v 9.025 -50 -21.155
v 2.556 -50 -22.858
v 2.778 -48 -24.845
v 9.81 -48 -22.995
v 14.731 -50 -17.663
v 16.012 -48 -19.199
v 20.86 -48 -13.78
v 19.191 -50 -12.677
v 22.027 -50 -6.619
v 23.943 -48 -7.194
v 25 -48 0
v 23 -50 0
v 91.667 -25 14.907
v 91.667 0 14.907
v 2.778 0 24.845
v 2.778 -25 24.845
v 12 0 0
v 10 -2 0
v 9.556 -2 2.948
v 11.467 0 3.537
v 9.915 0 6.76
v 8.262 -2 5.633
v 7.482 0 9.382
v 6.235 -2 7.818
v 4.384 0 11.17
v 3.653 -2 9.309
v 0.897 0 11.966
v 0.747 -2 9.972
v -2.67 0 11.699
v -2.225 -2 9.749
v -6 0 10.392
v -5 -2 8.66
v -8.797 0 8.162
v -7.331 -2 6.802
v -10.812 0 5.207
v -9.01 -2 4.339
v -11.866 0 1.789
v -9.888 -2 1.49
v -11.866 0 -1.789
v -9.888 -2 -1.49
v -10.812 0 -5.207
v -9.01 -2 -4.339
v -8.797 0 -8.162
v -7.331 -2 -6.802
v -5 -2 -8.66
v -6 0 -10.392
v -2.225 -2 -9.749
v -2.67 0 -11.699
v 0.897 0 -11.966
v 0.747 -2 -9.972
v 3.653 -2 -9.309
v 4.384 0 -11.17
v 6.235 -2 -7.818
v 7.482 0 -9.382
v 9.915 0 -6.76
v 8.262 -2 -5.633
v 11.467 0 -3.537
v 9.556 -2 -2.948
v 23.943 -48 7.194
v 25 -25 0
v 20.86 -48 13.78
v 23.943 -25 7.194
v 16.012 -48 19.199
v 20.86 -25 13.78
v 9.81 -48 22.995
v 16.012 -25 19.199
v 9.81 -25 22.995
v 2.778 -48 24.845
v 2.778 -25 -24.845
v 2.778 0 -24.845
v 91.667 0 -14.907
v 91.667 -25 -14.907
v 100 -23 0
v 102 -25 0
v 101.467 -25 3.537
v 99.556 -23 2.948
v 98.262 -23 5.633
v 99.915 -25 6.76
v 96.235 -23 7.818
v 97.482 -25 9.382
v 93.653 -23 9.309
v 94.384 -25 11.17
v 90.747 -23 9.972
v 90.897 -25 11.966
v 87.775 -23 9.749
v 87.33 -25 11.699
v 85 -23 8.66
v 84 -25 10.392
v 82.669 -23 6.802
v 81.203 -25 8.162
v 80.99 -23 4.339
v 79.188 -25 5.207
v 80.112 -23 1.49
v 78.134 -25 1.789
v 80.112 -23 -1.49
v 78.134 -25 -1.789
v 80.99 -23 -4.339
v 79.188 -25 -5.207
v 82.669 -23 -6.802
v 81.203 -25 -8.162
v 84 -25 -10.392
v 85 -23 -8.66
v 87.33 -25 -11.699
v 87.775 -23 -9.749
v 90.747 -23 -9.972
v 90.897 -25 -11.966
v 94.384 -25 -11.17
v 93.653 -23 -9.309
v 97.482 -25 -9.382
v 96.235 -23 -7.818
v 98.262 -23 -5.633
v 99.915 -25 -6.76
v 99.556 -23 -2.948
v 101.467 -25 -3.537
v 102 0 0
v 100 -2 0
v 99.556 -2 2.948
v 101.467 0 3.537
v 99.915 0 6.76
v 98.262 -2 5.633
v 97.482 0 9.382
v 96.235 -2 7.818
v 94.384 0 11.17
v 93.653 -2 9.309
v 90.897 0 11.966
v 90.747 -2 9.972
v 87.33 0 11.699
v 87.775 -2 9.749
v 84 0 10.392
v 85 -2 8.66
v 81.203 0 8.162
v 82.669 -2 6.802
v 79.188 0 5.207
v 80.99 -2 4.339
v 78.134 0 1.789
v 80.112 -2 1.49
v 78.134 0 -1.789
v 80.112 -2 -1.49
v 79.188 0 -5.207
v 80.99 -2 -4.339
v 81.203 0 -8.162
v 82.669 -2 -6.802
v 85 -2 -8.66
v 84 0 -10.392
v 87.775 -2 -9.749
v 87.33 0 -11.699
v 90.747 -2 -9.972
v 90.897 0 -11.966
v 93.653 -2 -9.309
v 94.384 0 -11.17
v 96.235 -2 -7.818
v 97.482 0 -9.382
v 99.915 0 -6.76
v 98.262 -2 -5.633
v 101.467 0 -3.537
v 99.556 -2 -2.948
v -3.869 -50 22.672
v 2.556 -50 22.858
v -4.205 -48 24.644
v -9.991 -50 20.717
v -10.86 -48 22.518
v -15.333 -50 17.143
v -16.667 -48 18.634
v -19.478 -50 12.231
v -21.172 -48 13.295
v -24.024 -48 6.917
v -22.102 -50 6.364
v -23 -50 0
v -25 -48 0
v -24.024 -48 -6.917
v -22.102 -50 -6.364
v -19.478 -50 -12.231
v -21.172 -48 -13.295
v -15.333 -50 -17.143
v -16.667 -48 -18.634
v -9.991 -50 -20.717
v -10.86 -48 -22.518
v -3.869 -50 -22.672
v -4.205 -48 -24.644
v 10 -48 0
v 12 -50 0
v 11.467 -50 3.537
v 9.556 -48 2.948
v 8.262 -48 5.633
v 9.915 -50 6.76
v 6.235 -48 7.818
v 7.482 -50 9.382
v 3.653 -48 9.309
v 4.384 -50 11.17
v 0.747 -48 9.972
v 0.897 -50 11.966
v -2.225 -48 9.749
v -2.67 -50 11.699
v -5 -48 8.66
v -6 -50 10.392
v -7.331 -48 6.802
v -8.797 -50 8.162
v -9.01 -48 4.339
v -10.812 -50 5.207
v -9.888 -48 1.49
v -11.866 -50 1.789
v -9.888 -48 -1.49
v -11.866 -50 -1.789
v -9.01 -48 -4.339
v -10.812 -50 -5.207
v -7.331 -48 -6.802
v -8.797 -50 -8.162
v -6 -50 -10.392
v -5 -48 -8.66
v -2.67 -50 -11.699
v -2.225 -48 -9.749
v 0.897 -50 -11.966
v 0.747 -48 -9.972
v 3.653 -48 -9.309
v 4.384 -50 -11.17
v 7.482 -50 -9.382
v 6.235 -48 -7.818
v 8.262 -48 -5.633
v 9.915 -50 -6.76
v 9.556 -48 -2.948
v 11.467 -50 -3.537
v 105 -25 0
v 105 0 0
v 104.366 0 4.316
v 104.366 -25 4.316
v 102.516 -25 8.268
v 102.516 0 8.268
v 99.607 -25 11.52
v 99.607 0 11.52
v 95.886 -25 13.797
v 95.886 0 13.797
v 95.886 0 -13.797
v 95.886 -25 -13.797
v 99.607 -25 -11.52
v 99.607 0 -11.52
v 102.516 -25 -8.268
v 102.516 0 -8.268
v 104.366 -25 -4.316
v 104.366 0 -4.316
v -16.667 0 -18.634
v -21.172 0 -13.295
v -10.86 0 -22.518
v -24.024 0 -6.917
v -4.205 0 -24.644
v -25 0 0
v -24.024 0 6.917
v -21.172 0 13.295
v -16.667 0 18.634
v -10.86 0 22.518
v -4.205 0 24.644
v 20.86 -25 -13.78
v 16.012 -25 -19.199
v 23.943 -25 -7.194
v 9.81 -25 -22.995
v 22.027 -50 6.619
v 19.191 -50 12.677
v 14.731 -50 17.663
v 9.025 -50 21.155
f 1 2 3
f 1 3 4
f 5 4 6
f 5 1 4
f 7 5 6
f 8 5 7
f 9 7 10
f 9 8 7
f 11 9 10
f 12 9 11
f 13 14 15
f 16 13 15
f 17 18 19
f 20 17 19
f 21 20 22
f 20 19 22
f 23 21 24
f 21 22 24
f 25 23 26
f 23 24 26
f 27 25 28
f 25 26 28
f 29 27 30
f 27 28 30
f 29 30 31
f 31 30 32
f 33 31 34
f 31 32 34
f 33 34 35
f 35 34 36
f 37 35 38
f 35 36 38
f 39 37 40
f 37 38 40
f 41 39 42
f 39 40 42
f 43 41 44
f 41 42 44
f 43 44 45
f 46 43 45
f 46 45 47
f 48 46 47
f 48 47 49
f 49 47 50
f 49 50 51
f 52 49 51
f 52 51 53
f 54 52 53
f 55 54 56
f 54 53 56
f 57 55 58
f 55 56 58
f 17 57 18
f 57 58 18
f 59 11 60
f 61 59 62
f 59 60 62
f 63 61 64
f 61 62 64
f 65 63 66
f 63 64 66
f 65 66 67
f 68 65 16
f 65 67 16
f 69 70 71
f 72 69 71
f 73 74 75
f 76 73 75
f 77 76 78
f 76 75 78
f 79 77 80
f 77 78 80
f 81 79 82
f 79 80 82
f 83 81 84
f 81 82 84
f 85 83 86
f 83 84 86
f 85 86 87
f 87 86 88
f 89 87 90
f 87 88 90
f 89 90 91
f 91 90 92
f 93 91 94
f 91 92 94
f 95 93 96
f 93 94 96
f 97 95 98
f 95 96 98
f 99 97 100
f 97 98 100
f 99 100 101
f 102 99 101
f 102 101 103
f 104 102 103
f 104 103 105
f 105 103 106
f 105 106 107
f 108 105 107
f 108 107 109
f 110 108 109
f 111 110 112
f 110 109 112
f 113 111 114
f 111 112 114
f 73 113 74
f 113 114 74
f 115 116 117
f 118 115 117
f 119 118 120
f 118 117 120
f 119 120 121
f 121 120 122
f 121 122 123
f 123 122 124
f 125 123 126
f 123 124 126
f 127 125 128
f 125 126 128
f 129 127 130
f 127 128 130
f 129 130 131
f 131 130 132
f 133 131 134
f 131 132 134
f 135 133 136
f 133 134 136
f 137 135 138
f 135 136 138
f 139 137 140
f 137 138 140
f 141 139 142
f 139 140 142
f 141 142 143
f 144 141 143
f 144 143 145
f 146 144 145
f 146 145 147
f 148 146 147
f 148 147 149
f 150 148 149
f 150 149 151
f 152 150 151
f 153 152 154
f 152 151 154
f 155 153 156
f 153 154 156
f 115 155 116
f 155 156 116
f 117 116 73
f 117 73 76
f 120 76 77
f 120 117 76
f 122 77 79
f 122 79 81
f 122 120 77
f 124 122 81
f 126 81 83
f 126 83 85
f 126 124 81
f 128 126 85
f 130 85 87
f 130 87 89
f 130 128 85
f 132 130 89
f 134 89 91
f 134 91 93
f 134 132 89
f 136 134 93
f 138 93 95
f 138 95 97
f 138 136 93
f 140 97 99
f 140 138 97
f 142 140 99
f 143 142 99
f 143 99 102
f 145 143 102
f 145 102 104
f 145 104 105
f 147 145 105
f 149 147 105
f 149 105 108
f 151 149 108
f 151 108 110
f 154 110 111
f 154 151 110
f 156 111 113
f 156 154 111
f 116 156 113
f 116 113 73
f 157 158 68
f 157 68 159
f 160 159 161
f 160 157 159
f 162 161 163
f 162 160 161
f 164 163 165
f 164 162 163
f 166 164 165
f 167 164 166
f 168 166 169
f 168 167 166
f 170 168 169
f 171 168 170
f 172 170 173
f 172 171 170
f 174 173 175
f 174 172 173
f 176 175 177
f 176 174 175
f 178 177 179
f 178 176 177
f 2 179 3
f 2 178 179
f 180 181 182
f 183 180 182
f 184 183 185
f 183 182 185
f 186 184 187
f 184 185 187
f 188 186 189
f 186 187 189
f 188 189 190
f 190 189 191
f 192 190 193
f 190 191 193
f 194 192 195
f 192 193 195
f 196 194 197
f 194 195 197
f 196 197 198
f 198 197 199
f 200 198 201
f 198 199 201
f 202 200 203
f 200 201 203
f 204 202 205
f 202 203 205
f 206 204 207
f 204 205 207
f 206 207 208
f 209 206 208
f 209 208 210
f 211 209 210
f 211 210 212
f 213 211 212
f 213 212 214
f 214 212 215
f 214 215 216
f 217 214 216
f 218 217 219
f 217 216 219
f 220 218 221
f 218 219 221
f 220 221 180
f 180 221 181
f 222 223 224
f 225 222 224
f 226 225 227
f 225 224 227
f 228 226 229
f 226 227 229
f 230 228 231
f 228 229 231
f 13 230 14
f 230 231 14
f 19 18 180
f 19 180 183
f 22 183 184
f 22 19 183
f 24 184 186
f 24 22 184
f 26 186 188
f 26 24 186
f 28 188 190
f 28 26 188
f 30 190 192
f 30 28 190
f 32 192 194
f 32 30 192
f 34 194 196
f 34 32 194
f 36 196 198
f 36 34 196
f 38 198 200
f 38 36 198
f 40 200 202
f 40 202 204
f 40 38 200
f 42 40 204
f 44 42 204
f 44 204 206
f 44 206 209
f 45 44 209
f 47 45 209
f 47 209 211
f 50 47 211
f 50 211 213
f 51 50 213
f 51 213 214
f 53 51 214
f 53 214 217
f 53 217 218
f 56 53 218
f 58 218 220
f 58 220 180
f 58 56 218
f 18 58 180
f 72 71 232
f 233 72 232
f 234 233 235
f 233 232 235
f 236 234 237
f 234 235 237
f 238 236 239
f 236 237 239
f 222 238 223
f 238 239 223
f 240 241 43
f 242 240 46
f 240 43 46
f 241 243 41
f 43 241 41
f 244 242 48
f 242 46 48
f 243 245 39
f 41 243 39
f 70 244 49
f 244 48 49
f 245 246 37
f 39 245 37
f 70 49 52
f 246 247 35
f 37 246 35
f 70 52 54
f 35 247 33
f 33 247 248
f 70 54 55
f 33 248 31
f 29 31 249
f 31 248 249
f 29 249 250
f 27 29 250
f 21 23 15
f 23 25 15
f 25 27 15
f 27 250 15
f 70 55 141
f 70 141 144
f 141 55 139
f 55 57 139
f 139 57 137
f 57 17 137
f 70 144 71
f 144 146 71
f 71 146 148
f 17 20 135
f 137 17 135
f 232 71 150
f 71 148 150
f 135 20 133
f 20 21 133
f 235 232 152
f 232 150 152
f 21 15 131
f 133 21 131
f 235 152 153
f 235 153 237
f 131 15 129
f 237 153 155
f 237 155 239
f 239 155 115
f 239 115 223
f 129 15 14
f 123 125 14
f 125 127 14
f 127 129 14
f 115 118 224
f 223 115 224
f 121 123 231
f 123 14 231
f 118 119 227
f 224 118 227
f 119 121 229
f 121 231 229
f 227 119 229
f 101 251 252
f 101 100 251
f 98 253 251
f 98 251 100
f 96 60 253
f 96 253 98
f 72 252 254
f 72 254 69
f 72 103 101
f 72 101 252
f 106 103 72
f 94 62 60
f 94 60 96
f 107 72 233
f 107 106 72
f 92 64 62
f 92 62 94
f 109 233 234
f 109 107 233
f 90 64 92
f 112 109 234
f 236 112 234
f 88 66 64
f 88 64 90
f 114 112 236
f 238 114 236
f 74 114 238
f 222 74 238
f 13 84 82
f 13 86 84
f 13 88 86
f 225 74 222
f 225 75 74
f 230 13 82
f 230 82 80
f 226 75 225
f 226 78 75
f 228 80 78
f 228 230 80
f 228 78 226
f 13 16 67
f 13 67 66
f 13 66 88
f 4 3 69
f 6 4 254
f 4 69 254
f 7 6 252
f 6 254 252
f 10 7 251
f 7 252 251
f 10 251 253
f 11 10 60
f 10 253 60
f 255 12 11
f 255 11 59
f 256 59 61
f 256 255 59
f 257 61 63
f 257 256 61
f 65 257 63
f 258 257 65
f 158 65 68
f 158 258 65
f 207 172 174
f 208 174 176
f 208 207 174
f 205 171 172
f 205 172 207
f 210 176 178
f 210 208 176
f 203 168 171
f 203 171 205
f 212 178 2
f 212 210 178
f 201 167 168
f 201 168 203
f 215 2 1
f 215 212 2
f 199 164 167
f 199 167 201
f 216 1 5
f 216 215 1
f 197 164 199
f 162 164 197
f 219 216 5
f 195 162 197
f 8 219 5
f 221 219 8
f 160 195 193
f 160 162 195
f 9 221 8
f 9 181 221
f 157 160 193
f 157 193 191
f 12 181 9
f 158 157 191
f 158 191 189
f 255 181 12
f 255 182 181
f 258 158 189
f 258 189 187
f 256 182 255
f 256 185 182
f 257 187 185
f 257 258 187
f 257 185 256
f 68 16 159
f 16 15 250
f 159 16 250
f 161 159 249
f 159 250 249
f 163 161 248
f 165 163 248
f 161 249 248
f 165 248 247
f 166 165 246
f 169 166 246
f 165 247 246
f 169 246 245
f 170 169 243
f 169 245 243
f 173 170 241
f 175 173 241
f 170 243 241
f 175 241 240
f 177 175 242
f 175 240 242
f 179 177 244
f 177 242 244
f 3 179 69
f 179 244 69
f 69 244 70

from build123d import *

# Parameters (mm, degrees)
F0_R     = 10
F1_DEPTH = 25
F2_DEPTH = 50
F3_SIZE  = 2


with BuildPart() as f1:
    # F0 (on Front) → F1 (new body)
    with BuildSketch(Plane.XZ):
        with BuildLine():
            ThreePointArc((2.777778, -24.8452), (18.6339, -16.666667), (25, 0))
            ThreePointArc((25, 0), (18.6339, 16.666667), (2.777778, 24.8452))
            ThreePointArc((2.777778, 24.8452), (-25, 0), (2.777778, -24.8452))
        make_face()
        Circle(F0_R, mode=Mode.SUBTRACT)
        with BuildLine():
            ThreePointArc((2.777778, 24.8452), (18.6339, 16.666667), (25, 0))
            ThreePointArc((25, 0), (18.6339, -16.666667), (2.777778, -24.8452))
            Line((2.777778, -24.8452), (91.666667, -14.90712))
            ThreePointArc((91.666667, -14.90712), (75, 0), (91.666667, 14.90712))
            Line((91.666667, 14.90712), (2.777778, 24.8452))
        make_face()
        with BuildLine():
            ThreePointArc((105, 0), (101.18034, 10), (91.666667, 14.90712))
            ThreePointArc((91.666667, 14.90712), (75, 0), (91.666667, -14.90712))
            ThreePointArc((91.666667, -14.90712), (101.18034, -10), (105, 0))
        make_face()
        with Locations((90, 0)):
            Circle(F0_R, mode=Mode.SUBTRACT)
    extrude(amount=F1_DEPTH)

    # F0 (on Front) → F2 (join)
    with BuildSketch(Plane.XZ):
        with BuildLine():
            ThreePointArc((2.777778, -24.8452), (18.6339, -16.666667), (25, 0))
            ThreePointArc((25, 0), (18.6339, 16.666667), (2.777778, 24.8452))
            ThreePointArc((2.777778, 24.8452), (-25, 0), (2.777778, -24.8452))
        make_face()
        Circle(F0_R, mode=Mode.SUBTRACT)
    extrude(amount=F2_DEPTH)

    # F3
    f3_edges = [f1.edges().sort_by_distance(p)[0] for p in [
        (-10, -50, 0),
        (-10, 0, 0),
        (-2.777778, -50, 24.8452),
        (80, 0, 0),
        (80, -25, 0),
    ]]
    chamfer(f3_edges, length=F3_SIZE)


solid = f1.part
